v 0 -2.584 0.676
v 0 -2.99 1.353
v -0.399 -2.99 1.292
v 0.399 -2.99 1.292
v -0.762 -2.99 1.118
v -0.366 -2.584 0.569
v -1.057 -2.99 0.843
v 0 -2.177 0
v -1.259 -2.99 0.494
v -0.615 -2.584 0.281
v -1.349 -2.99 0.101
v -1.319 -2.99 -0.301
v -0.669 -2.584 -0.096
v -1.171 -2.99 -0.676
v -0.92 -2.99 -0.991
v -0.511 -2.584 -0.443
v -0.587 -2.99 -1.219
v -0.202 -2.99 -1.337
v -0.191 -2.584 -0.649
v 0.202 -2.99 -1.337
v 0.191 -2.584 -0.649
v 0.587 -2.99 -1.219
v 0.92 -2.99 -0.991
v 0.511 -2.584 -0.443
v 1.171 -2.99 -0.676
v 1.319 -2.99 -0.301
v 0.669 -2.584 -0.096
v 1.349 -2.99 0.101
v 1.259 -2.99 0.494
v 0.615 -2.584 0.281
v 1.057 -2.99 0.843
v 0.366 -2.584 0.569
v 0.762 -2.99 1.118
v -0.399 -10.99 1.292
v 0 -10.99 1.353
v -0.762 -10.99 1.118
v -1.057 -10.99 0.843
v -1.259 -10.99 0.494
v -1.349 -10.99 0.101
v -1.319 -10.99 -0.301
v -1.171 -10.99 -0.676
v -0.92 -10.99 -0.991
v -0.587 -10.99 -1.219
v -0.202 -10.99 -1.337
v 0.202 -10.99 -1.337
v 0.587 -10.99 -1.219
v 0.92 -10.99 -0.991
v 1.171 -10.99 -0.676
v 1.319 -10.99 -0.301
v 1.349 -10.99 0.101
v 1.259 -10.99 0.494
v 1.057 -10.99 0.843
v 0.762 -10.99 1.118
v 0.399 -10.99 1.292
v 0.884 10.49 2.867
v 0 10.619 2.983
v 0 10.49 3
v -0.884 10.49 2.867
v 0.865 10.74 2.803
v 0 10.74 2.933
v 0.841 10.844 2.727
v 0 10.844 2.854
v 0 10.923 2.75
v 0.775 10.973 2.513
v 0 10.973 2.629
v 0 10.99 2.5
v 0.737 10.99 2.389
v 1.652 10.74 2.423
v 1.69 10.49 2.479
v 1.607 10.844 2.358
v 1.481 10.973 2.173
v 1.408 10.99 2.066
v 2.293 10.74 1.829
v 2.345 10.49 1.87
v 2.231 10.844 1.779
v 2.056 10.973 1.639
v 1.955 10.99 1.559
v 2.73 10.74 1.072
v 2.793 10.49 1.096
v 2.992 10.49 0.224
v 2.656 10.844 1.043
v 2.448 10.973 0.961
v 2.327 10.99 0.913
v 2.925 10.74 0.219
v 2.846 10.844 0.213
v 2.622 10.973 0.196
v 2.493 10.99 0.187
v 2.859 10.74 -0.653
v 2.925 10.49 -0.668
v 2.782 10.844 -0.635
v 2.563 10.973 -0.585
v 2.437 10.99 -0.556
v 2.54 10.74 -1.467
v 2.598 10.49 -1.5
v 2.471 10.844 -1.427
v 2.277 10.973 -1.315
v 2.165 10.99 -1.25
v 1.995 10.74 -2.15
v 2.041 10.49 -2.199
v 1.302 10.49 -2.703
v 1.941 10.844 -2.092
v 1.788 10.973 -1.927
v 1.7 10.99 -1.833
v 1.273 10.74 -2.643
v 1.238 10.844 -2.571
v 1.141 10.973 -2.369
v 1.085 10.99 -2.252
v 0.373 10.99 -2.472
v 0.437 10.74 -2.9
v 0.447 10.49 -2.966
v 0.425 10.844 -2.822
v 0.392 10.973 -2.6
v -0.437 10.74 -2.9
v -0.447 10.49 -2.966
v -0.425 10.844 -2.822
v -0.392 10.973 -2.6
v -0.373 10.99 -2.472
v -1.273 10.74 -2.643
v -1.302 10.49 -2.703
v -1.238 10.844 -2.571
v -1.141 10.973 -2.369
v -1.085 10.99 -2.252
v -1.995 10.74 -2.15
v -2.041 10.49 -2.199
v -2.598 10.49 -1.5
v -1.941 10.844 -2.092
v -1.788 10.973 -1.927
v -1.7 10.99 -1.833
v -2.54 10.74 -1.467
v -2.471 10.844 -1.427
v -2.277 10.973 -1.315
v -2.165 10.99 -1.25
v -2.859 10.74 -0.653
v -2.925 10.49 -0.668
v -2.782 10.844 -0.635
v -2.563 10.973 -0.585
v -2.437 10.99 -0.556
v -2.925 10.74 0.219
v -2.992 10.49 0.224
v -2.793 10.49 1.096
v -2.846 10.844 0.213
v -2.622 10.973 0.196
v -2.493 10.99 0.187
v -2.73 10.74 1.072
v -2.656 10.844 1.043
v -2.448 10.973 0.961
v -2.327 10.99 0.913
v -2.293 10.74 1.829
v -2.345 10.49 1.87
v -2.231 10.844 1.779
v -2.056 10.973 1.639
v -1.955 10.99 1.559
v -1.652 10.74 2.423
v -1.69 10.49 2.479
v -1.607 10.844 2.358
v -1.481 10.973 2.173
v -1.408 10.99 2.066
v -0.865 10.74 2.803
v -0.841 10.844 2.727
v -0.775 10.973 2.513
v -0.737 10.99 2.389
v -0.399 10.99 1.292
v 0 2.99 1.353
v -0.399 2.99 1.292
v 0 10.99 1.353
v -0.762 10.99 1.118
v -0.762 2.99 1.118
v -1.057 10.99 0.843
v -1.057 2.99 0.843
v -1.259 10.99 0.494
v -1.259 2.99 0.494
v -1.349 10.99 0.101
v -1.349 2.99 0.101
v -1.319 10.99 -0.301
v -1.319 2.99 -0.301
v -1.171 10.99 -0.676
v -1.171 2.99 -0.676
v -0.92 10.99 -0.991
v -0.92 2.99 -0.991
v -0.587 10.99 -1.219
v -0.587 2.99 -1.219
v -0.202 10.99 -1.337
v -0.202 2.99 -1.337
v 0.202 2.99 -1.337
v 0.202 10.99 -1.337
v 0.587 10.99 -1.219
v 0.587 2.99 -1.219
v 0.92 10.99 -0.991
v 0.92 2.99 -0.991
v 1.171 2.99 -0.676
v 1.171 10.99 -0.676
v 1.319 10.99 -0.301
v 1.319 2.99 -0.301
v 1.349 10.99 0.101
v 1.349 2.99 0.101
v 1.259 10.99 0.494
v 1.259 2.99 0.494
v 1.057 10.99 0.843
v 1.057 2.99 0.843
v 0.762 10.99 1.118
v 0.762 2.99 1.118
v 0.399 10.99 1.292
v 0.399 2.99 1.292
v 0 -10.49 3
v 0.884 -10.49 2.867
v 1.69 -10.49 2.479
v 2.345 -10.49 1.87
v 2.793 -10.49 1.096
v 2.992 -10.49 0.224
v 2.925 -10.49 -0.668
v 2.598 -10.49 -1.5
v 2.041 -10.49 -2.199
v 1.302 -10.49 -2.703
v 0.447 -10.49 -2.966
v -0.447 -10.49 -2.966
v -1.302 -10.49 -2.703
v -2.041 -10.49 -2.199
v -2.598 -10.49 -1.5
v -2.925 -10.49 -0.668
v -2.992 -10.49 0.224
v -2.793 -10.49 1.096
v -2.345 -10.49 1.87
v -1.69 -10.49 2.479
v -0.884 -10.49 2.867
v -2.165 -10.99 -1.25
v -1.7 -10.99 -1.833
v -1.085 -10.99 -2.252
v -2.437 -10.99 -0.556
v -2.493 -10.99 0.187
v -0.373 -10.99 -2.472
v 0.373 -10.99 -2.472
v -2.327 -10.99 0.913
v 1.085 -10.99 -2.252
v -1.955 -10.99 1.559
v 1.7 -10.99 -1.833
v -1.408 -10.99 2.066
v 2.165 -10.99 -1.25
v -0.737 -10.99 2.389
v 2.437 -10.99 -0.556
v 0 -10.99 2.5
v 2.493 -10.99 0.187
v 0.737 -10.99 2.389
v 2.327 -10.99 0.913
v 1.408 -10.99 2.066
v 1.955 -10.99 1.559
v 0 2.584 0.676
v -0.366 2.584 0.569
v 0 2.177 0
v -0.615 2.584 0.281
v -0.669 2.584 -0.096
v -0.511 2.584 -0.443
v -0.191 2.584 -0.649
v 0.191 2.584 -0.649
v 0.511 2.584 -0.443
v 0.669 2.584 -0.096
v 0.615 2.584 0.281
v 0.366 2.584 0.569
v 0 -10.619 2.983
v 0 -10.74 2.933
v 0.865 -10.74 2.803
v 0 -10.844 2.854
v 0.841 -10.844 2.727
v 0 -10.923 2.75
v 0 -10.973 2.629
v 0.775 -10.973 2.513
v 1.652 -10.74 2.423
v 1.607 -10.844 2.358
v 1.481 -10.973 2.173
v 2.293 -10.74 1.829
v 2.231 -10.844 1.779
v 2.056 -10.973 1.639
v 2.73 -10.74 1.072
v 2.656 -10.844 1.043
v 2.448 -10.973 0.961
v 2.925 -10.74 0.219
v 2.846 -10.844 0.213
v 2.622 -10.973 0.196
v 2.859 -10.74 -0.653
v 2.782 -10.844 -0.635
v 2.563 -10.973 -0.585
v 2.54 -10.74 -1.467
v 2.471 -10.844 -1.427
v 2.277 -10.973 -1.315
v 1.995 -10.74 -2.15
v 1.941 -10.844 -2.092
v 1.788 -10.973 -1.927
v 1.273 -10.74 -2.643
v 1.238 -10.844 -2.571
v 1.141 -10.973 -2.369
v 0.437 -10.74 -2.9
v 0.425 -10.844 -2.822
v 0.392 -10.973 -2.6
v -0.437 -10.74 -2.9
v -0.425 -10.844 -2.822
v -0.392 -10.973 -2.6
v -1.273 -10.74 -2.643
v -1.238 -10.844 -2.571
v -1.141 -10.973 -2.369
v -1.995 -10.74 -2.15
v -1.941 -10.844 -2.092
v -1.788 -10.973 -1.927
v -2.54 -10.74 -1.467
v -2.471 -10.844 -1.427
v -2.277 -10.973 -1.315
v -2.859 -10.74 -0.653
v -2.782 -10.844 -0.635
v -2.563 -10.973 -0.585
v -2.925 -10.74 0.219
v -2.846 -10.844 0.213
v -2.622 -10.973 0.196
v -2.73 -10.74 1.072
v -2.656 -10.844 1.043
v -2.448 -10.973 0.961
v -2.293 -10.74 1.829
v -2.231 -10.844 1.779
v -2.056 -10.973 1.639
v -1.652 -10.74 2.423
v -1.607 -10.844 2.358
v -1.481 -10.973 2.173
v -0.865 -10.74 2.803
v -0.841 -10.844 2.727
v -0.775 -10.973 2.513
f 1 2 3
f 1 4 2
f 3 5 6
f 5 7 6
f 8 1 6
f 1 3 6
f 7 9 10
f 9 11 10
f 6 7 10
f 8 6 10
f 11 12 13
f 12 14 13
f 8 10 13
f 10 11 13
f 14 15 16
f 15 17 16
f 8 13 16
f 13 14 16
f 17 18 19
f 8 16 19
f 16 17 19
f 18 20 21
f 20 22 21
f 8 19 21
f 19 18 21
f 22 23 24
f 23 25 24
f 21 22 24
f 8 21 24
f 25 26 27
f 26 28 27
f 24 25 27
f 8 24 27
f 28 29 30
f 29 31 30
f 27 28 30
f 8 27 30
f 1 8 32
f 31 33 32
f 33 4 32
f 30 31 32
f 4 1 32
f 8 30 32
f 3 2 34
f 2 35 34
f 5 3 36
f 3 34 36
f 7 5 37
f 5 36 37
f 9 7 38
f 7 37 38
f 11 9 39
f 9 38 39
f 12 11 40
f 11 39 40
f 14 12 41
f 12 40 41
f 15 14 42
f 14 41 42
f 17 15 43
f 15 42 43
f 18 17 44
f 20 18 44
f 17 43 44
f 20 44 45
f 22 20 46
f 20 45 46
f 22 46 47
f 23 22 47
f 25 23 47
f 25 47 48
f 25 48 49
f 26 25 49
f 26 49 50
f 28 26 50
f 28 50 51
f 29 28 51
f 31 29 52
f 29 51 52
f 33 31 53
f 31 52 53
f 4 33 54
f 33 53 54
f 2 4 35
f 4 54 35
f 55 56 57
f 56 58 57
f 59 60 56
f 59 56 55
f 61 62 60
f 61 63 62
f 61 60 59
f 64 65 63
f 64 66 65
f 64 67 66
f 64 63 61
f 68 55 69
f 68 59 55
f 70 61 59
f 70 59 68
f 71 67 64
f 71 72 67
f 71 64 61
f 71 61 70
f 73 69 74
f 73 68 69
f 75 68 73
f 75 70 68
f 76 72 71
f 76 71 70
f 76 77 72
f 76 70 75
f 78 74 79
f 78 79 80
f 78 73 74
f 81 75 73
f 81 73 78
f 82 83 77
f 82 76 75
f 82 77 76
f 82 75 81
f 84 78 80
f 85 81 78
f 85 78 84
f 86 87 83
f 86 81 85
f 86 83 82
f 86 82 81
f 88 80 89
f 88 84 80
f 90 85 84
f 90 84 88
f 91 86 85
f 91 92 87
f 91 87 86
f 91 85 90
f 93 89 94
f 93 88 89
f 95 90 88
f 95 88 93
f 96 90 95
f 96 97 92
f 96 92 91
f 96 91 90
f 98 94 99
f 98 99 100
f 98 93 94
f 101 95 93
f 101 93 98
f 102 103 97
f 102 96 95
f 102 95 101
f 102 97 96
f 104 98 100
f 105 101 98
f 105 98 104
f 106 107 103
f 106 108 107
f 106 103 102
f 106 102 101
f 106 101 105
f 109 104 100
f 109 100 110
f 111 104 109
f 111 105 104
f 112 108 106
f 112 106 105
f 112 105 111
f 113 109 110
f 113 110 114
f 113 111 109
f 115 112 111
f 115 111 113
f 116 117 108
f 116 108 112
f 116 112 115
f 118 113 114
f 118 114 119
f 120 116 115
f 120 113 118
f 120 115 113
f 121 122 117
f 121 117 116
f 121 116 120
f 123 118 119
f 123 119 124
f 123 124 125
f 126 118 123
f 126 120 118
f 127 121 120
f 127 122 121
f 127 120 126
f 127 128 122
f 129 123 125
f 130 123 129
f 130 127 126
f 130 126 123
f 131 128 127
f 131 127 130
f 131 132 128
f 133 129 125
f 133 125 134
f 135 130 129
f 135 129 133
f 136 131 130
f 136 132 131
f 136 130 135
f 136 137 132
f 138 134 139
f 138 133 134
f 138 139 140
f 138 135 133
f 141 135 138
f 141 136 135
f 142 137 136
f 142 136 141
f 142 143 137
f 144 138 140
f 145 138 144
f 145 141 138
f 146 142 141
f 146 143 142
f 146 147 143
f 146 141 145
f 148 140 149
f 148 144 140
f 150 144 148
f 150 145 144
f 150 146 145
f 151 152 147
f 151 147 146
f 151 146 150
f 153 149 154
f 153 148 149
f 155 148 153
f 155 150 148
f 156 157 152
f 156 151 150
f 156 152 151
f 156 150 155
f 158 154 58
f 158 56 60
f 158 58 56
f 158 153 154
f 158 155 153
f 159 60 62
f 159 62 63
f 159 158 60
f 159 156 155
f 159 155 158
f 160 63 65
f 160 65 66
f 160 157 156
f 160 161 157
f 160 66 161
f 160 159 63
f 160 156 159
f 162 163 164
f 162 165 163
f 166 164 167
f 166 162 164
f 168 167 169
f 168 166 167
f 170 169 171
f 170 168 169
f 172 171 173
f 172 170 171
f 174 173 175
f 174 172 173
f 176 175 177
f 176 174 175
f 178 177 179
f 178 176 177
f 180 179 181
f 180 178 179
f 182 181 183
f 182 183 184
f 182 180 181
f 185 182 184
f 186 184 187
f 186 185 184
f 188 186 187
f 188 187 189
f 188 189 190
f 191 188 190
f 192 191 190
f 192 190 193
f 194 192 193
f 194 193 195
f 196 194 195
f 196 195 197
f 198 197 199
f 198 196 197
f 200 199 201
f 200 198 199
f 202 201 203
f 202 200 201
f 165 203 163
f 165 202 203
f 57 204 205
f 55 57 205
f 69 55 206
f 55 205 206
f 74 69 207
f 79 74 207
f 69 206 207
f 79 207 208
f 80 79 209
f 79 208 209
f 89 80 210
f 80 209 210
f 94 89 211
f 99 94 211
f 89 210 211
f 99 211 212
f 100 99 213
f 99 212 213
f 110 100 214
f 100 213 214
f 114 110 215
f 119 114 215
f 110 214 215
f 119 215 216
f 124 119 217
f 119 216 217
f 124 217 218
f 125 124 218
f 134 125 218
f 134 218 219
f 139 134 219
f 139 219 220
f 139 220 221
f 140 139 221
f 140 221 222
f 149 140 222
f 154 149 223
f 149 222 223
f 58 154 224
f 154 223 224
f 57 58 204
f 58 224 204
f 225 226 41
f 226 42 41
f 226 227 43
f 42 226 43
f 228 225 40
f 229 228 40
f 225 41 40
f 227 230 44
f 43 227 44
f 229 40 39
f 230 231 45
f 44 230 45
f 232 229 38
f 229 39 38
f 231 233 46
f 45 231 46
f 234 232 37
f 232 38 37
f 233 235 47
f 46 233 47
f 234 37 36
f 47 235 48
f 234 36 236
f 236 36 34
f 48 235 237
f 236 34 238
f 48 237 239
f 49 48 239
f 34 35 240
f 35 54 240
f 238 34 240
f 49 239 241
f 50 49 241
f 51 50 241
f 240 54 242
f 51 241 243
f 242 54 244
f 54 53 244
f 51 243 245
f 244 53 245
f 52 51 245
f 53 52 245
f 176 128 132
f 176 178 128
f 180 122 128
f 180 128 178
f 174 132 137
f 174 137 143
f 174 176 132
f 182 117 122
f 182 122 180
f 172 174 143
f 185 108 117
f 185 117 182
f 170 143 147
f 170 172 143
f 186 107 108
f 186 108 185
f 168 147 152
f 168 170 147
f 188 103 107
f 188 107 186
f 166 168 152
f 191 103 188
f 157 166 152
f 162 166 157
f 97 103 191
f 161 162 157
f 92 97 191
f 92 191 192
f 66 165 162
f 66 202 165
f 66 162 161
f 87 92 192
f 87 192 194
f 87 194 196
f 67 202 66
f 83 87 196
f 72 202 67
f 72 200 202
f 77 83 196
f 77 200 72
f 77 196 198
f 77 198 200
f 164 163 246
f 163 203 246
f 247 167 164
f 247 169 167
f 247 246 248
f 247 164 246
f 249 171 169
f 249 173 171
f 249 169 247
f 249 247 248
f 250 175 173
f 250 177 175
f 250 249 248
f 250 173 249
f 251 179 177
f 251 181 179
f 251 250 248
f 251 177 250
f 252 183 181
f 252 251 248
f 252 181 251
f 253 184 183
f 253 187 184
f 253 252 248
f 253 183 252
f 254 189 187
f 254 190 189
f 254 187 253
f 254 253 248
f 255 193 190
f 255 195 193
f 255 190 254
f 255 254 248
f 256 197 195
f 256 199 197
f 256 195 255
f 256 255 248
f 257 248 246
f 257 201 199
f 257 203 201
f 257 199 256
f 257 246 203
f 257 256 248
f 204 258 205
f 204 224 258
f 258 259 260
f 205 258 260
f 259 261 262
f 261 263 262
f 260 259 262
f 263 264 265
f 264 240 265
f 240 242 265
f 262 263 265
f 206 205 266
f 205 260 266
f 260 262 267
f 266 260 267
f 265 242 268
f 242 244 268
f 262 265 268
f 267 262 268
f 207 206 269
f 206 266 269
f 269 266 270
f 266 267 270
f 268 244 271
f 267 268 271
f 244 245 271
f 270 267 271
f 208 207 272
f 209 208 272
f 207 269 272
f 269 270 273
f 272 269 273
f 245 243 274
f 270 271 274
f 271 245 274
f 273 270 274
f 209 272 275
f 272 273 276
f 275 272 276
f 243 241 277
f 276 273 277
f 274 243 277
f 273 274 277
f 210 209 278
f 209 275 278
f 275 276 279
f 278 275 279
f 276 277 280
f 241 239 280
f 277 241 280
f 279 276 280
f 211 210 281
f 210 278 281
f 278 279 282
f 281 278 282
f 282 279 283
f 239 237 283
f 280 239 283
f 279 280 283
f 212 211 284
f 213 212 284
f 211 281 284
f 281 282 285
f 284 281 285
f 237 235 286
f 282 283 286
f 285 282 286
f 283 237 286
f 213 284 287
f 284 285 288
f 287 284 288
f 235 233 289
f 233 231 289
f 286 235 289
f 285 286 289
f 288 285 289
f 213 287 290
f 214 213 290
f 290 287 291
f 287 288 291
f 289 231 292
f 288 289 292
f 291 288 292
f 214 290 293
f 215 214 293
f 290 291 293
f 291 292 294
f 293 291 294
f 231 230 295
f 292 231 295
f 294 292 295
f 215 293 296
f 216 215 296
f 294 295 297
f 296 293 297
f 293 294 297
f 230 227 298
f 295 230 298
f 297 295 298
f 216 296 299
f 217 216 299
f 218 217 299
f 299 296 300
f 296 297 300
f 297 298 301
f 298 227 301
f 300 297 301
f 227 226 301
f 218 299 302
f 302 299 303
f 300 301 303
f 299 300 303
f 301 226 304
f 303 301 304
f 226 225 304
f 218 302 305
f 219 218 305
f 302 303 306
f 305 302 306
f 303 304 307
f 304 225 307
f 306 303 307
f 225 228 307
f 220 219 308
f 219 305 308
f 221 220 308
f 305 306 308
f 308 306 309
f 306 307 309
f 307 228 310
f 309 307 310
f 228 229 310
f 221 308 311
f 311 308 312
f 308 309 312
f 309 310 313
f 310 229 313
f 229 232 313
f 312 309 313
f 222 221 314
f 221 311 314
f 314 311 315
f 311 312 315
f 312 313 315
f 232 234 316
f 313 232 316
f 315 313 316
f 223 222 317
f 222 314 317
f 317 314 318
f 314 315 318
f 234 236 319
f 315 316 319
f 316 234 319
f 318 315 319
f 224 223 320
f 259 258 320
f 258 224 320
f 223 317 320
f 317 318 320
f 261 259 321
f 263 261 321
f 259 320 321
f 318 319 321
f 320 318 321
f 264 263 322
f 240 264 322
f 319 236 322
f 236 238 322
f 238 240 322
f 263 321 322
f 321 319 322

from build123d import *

# Parameters (mm, degrees)
BOSS_EXTRUDE1_DEPTH      = 10.99
BOSS_EXTRUDE1_DEPTH_BACK = 10.99
SKETCH1_R                = 3
FILLET1_R                = 0.5


with BuildPart() as part:
    # Sketch1 → Boss-Extrude1 (new, two sides: drawn at the far end of the back side and taken through both)
    with BuildSketch(Plane(origin=(0, 0, 0), x_dir=(1, 0, 0), z_dir=(0, 1, 0)).offset(-BOSS_EXTRUDE1_DEPTH_BACK)):
        Circle(SKETCH1_R)
    extrude(amount=BOSS_EXTRUDE1_DEPTH + BOSS_EXTRUDE1_DEPTH_BACK)

    # Sketch3 → #6-32 Tapped Hole1 (revolve, cut)
    with BuildSketch(Plane(origin=(0, 10.99, 0), x_dir=(0, 0, 1), z_dir=(1, 0, 0))):
        Polygon((0, 0), (0, 8.81269403), (1.35255, 8), (1.35255, 0), align=None)
    f_6_32_tapped_hole1 = revolve(axis=Axis((0, 17.34, 0), (0, -1, 0)), mode=Mode.SUBTRACT)

    # Fillet1
    fillet1_edges = [part.edges().sort_by_distance(p)[0] for p in [
        (-3, -10.99, 0),
        (-3, 10.99, 0),
    ]]
    fillet(fillet1_edges, radius=FILLET1_R)

    # Mirror1: #6-32 Tapped Hole1 across plane
    add(f_6_32_tapped_hole1.mirror(Plane.ZX), mode=Mode.SUBTRACT)


solid = part.part
